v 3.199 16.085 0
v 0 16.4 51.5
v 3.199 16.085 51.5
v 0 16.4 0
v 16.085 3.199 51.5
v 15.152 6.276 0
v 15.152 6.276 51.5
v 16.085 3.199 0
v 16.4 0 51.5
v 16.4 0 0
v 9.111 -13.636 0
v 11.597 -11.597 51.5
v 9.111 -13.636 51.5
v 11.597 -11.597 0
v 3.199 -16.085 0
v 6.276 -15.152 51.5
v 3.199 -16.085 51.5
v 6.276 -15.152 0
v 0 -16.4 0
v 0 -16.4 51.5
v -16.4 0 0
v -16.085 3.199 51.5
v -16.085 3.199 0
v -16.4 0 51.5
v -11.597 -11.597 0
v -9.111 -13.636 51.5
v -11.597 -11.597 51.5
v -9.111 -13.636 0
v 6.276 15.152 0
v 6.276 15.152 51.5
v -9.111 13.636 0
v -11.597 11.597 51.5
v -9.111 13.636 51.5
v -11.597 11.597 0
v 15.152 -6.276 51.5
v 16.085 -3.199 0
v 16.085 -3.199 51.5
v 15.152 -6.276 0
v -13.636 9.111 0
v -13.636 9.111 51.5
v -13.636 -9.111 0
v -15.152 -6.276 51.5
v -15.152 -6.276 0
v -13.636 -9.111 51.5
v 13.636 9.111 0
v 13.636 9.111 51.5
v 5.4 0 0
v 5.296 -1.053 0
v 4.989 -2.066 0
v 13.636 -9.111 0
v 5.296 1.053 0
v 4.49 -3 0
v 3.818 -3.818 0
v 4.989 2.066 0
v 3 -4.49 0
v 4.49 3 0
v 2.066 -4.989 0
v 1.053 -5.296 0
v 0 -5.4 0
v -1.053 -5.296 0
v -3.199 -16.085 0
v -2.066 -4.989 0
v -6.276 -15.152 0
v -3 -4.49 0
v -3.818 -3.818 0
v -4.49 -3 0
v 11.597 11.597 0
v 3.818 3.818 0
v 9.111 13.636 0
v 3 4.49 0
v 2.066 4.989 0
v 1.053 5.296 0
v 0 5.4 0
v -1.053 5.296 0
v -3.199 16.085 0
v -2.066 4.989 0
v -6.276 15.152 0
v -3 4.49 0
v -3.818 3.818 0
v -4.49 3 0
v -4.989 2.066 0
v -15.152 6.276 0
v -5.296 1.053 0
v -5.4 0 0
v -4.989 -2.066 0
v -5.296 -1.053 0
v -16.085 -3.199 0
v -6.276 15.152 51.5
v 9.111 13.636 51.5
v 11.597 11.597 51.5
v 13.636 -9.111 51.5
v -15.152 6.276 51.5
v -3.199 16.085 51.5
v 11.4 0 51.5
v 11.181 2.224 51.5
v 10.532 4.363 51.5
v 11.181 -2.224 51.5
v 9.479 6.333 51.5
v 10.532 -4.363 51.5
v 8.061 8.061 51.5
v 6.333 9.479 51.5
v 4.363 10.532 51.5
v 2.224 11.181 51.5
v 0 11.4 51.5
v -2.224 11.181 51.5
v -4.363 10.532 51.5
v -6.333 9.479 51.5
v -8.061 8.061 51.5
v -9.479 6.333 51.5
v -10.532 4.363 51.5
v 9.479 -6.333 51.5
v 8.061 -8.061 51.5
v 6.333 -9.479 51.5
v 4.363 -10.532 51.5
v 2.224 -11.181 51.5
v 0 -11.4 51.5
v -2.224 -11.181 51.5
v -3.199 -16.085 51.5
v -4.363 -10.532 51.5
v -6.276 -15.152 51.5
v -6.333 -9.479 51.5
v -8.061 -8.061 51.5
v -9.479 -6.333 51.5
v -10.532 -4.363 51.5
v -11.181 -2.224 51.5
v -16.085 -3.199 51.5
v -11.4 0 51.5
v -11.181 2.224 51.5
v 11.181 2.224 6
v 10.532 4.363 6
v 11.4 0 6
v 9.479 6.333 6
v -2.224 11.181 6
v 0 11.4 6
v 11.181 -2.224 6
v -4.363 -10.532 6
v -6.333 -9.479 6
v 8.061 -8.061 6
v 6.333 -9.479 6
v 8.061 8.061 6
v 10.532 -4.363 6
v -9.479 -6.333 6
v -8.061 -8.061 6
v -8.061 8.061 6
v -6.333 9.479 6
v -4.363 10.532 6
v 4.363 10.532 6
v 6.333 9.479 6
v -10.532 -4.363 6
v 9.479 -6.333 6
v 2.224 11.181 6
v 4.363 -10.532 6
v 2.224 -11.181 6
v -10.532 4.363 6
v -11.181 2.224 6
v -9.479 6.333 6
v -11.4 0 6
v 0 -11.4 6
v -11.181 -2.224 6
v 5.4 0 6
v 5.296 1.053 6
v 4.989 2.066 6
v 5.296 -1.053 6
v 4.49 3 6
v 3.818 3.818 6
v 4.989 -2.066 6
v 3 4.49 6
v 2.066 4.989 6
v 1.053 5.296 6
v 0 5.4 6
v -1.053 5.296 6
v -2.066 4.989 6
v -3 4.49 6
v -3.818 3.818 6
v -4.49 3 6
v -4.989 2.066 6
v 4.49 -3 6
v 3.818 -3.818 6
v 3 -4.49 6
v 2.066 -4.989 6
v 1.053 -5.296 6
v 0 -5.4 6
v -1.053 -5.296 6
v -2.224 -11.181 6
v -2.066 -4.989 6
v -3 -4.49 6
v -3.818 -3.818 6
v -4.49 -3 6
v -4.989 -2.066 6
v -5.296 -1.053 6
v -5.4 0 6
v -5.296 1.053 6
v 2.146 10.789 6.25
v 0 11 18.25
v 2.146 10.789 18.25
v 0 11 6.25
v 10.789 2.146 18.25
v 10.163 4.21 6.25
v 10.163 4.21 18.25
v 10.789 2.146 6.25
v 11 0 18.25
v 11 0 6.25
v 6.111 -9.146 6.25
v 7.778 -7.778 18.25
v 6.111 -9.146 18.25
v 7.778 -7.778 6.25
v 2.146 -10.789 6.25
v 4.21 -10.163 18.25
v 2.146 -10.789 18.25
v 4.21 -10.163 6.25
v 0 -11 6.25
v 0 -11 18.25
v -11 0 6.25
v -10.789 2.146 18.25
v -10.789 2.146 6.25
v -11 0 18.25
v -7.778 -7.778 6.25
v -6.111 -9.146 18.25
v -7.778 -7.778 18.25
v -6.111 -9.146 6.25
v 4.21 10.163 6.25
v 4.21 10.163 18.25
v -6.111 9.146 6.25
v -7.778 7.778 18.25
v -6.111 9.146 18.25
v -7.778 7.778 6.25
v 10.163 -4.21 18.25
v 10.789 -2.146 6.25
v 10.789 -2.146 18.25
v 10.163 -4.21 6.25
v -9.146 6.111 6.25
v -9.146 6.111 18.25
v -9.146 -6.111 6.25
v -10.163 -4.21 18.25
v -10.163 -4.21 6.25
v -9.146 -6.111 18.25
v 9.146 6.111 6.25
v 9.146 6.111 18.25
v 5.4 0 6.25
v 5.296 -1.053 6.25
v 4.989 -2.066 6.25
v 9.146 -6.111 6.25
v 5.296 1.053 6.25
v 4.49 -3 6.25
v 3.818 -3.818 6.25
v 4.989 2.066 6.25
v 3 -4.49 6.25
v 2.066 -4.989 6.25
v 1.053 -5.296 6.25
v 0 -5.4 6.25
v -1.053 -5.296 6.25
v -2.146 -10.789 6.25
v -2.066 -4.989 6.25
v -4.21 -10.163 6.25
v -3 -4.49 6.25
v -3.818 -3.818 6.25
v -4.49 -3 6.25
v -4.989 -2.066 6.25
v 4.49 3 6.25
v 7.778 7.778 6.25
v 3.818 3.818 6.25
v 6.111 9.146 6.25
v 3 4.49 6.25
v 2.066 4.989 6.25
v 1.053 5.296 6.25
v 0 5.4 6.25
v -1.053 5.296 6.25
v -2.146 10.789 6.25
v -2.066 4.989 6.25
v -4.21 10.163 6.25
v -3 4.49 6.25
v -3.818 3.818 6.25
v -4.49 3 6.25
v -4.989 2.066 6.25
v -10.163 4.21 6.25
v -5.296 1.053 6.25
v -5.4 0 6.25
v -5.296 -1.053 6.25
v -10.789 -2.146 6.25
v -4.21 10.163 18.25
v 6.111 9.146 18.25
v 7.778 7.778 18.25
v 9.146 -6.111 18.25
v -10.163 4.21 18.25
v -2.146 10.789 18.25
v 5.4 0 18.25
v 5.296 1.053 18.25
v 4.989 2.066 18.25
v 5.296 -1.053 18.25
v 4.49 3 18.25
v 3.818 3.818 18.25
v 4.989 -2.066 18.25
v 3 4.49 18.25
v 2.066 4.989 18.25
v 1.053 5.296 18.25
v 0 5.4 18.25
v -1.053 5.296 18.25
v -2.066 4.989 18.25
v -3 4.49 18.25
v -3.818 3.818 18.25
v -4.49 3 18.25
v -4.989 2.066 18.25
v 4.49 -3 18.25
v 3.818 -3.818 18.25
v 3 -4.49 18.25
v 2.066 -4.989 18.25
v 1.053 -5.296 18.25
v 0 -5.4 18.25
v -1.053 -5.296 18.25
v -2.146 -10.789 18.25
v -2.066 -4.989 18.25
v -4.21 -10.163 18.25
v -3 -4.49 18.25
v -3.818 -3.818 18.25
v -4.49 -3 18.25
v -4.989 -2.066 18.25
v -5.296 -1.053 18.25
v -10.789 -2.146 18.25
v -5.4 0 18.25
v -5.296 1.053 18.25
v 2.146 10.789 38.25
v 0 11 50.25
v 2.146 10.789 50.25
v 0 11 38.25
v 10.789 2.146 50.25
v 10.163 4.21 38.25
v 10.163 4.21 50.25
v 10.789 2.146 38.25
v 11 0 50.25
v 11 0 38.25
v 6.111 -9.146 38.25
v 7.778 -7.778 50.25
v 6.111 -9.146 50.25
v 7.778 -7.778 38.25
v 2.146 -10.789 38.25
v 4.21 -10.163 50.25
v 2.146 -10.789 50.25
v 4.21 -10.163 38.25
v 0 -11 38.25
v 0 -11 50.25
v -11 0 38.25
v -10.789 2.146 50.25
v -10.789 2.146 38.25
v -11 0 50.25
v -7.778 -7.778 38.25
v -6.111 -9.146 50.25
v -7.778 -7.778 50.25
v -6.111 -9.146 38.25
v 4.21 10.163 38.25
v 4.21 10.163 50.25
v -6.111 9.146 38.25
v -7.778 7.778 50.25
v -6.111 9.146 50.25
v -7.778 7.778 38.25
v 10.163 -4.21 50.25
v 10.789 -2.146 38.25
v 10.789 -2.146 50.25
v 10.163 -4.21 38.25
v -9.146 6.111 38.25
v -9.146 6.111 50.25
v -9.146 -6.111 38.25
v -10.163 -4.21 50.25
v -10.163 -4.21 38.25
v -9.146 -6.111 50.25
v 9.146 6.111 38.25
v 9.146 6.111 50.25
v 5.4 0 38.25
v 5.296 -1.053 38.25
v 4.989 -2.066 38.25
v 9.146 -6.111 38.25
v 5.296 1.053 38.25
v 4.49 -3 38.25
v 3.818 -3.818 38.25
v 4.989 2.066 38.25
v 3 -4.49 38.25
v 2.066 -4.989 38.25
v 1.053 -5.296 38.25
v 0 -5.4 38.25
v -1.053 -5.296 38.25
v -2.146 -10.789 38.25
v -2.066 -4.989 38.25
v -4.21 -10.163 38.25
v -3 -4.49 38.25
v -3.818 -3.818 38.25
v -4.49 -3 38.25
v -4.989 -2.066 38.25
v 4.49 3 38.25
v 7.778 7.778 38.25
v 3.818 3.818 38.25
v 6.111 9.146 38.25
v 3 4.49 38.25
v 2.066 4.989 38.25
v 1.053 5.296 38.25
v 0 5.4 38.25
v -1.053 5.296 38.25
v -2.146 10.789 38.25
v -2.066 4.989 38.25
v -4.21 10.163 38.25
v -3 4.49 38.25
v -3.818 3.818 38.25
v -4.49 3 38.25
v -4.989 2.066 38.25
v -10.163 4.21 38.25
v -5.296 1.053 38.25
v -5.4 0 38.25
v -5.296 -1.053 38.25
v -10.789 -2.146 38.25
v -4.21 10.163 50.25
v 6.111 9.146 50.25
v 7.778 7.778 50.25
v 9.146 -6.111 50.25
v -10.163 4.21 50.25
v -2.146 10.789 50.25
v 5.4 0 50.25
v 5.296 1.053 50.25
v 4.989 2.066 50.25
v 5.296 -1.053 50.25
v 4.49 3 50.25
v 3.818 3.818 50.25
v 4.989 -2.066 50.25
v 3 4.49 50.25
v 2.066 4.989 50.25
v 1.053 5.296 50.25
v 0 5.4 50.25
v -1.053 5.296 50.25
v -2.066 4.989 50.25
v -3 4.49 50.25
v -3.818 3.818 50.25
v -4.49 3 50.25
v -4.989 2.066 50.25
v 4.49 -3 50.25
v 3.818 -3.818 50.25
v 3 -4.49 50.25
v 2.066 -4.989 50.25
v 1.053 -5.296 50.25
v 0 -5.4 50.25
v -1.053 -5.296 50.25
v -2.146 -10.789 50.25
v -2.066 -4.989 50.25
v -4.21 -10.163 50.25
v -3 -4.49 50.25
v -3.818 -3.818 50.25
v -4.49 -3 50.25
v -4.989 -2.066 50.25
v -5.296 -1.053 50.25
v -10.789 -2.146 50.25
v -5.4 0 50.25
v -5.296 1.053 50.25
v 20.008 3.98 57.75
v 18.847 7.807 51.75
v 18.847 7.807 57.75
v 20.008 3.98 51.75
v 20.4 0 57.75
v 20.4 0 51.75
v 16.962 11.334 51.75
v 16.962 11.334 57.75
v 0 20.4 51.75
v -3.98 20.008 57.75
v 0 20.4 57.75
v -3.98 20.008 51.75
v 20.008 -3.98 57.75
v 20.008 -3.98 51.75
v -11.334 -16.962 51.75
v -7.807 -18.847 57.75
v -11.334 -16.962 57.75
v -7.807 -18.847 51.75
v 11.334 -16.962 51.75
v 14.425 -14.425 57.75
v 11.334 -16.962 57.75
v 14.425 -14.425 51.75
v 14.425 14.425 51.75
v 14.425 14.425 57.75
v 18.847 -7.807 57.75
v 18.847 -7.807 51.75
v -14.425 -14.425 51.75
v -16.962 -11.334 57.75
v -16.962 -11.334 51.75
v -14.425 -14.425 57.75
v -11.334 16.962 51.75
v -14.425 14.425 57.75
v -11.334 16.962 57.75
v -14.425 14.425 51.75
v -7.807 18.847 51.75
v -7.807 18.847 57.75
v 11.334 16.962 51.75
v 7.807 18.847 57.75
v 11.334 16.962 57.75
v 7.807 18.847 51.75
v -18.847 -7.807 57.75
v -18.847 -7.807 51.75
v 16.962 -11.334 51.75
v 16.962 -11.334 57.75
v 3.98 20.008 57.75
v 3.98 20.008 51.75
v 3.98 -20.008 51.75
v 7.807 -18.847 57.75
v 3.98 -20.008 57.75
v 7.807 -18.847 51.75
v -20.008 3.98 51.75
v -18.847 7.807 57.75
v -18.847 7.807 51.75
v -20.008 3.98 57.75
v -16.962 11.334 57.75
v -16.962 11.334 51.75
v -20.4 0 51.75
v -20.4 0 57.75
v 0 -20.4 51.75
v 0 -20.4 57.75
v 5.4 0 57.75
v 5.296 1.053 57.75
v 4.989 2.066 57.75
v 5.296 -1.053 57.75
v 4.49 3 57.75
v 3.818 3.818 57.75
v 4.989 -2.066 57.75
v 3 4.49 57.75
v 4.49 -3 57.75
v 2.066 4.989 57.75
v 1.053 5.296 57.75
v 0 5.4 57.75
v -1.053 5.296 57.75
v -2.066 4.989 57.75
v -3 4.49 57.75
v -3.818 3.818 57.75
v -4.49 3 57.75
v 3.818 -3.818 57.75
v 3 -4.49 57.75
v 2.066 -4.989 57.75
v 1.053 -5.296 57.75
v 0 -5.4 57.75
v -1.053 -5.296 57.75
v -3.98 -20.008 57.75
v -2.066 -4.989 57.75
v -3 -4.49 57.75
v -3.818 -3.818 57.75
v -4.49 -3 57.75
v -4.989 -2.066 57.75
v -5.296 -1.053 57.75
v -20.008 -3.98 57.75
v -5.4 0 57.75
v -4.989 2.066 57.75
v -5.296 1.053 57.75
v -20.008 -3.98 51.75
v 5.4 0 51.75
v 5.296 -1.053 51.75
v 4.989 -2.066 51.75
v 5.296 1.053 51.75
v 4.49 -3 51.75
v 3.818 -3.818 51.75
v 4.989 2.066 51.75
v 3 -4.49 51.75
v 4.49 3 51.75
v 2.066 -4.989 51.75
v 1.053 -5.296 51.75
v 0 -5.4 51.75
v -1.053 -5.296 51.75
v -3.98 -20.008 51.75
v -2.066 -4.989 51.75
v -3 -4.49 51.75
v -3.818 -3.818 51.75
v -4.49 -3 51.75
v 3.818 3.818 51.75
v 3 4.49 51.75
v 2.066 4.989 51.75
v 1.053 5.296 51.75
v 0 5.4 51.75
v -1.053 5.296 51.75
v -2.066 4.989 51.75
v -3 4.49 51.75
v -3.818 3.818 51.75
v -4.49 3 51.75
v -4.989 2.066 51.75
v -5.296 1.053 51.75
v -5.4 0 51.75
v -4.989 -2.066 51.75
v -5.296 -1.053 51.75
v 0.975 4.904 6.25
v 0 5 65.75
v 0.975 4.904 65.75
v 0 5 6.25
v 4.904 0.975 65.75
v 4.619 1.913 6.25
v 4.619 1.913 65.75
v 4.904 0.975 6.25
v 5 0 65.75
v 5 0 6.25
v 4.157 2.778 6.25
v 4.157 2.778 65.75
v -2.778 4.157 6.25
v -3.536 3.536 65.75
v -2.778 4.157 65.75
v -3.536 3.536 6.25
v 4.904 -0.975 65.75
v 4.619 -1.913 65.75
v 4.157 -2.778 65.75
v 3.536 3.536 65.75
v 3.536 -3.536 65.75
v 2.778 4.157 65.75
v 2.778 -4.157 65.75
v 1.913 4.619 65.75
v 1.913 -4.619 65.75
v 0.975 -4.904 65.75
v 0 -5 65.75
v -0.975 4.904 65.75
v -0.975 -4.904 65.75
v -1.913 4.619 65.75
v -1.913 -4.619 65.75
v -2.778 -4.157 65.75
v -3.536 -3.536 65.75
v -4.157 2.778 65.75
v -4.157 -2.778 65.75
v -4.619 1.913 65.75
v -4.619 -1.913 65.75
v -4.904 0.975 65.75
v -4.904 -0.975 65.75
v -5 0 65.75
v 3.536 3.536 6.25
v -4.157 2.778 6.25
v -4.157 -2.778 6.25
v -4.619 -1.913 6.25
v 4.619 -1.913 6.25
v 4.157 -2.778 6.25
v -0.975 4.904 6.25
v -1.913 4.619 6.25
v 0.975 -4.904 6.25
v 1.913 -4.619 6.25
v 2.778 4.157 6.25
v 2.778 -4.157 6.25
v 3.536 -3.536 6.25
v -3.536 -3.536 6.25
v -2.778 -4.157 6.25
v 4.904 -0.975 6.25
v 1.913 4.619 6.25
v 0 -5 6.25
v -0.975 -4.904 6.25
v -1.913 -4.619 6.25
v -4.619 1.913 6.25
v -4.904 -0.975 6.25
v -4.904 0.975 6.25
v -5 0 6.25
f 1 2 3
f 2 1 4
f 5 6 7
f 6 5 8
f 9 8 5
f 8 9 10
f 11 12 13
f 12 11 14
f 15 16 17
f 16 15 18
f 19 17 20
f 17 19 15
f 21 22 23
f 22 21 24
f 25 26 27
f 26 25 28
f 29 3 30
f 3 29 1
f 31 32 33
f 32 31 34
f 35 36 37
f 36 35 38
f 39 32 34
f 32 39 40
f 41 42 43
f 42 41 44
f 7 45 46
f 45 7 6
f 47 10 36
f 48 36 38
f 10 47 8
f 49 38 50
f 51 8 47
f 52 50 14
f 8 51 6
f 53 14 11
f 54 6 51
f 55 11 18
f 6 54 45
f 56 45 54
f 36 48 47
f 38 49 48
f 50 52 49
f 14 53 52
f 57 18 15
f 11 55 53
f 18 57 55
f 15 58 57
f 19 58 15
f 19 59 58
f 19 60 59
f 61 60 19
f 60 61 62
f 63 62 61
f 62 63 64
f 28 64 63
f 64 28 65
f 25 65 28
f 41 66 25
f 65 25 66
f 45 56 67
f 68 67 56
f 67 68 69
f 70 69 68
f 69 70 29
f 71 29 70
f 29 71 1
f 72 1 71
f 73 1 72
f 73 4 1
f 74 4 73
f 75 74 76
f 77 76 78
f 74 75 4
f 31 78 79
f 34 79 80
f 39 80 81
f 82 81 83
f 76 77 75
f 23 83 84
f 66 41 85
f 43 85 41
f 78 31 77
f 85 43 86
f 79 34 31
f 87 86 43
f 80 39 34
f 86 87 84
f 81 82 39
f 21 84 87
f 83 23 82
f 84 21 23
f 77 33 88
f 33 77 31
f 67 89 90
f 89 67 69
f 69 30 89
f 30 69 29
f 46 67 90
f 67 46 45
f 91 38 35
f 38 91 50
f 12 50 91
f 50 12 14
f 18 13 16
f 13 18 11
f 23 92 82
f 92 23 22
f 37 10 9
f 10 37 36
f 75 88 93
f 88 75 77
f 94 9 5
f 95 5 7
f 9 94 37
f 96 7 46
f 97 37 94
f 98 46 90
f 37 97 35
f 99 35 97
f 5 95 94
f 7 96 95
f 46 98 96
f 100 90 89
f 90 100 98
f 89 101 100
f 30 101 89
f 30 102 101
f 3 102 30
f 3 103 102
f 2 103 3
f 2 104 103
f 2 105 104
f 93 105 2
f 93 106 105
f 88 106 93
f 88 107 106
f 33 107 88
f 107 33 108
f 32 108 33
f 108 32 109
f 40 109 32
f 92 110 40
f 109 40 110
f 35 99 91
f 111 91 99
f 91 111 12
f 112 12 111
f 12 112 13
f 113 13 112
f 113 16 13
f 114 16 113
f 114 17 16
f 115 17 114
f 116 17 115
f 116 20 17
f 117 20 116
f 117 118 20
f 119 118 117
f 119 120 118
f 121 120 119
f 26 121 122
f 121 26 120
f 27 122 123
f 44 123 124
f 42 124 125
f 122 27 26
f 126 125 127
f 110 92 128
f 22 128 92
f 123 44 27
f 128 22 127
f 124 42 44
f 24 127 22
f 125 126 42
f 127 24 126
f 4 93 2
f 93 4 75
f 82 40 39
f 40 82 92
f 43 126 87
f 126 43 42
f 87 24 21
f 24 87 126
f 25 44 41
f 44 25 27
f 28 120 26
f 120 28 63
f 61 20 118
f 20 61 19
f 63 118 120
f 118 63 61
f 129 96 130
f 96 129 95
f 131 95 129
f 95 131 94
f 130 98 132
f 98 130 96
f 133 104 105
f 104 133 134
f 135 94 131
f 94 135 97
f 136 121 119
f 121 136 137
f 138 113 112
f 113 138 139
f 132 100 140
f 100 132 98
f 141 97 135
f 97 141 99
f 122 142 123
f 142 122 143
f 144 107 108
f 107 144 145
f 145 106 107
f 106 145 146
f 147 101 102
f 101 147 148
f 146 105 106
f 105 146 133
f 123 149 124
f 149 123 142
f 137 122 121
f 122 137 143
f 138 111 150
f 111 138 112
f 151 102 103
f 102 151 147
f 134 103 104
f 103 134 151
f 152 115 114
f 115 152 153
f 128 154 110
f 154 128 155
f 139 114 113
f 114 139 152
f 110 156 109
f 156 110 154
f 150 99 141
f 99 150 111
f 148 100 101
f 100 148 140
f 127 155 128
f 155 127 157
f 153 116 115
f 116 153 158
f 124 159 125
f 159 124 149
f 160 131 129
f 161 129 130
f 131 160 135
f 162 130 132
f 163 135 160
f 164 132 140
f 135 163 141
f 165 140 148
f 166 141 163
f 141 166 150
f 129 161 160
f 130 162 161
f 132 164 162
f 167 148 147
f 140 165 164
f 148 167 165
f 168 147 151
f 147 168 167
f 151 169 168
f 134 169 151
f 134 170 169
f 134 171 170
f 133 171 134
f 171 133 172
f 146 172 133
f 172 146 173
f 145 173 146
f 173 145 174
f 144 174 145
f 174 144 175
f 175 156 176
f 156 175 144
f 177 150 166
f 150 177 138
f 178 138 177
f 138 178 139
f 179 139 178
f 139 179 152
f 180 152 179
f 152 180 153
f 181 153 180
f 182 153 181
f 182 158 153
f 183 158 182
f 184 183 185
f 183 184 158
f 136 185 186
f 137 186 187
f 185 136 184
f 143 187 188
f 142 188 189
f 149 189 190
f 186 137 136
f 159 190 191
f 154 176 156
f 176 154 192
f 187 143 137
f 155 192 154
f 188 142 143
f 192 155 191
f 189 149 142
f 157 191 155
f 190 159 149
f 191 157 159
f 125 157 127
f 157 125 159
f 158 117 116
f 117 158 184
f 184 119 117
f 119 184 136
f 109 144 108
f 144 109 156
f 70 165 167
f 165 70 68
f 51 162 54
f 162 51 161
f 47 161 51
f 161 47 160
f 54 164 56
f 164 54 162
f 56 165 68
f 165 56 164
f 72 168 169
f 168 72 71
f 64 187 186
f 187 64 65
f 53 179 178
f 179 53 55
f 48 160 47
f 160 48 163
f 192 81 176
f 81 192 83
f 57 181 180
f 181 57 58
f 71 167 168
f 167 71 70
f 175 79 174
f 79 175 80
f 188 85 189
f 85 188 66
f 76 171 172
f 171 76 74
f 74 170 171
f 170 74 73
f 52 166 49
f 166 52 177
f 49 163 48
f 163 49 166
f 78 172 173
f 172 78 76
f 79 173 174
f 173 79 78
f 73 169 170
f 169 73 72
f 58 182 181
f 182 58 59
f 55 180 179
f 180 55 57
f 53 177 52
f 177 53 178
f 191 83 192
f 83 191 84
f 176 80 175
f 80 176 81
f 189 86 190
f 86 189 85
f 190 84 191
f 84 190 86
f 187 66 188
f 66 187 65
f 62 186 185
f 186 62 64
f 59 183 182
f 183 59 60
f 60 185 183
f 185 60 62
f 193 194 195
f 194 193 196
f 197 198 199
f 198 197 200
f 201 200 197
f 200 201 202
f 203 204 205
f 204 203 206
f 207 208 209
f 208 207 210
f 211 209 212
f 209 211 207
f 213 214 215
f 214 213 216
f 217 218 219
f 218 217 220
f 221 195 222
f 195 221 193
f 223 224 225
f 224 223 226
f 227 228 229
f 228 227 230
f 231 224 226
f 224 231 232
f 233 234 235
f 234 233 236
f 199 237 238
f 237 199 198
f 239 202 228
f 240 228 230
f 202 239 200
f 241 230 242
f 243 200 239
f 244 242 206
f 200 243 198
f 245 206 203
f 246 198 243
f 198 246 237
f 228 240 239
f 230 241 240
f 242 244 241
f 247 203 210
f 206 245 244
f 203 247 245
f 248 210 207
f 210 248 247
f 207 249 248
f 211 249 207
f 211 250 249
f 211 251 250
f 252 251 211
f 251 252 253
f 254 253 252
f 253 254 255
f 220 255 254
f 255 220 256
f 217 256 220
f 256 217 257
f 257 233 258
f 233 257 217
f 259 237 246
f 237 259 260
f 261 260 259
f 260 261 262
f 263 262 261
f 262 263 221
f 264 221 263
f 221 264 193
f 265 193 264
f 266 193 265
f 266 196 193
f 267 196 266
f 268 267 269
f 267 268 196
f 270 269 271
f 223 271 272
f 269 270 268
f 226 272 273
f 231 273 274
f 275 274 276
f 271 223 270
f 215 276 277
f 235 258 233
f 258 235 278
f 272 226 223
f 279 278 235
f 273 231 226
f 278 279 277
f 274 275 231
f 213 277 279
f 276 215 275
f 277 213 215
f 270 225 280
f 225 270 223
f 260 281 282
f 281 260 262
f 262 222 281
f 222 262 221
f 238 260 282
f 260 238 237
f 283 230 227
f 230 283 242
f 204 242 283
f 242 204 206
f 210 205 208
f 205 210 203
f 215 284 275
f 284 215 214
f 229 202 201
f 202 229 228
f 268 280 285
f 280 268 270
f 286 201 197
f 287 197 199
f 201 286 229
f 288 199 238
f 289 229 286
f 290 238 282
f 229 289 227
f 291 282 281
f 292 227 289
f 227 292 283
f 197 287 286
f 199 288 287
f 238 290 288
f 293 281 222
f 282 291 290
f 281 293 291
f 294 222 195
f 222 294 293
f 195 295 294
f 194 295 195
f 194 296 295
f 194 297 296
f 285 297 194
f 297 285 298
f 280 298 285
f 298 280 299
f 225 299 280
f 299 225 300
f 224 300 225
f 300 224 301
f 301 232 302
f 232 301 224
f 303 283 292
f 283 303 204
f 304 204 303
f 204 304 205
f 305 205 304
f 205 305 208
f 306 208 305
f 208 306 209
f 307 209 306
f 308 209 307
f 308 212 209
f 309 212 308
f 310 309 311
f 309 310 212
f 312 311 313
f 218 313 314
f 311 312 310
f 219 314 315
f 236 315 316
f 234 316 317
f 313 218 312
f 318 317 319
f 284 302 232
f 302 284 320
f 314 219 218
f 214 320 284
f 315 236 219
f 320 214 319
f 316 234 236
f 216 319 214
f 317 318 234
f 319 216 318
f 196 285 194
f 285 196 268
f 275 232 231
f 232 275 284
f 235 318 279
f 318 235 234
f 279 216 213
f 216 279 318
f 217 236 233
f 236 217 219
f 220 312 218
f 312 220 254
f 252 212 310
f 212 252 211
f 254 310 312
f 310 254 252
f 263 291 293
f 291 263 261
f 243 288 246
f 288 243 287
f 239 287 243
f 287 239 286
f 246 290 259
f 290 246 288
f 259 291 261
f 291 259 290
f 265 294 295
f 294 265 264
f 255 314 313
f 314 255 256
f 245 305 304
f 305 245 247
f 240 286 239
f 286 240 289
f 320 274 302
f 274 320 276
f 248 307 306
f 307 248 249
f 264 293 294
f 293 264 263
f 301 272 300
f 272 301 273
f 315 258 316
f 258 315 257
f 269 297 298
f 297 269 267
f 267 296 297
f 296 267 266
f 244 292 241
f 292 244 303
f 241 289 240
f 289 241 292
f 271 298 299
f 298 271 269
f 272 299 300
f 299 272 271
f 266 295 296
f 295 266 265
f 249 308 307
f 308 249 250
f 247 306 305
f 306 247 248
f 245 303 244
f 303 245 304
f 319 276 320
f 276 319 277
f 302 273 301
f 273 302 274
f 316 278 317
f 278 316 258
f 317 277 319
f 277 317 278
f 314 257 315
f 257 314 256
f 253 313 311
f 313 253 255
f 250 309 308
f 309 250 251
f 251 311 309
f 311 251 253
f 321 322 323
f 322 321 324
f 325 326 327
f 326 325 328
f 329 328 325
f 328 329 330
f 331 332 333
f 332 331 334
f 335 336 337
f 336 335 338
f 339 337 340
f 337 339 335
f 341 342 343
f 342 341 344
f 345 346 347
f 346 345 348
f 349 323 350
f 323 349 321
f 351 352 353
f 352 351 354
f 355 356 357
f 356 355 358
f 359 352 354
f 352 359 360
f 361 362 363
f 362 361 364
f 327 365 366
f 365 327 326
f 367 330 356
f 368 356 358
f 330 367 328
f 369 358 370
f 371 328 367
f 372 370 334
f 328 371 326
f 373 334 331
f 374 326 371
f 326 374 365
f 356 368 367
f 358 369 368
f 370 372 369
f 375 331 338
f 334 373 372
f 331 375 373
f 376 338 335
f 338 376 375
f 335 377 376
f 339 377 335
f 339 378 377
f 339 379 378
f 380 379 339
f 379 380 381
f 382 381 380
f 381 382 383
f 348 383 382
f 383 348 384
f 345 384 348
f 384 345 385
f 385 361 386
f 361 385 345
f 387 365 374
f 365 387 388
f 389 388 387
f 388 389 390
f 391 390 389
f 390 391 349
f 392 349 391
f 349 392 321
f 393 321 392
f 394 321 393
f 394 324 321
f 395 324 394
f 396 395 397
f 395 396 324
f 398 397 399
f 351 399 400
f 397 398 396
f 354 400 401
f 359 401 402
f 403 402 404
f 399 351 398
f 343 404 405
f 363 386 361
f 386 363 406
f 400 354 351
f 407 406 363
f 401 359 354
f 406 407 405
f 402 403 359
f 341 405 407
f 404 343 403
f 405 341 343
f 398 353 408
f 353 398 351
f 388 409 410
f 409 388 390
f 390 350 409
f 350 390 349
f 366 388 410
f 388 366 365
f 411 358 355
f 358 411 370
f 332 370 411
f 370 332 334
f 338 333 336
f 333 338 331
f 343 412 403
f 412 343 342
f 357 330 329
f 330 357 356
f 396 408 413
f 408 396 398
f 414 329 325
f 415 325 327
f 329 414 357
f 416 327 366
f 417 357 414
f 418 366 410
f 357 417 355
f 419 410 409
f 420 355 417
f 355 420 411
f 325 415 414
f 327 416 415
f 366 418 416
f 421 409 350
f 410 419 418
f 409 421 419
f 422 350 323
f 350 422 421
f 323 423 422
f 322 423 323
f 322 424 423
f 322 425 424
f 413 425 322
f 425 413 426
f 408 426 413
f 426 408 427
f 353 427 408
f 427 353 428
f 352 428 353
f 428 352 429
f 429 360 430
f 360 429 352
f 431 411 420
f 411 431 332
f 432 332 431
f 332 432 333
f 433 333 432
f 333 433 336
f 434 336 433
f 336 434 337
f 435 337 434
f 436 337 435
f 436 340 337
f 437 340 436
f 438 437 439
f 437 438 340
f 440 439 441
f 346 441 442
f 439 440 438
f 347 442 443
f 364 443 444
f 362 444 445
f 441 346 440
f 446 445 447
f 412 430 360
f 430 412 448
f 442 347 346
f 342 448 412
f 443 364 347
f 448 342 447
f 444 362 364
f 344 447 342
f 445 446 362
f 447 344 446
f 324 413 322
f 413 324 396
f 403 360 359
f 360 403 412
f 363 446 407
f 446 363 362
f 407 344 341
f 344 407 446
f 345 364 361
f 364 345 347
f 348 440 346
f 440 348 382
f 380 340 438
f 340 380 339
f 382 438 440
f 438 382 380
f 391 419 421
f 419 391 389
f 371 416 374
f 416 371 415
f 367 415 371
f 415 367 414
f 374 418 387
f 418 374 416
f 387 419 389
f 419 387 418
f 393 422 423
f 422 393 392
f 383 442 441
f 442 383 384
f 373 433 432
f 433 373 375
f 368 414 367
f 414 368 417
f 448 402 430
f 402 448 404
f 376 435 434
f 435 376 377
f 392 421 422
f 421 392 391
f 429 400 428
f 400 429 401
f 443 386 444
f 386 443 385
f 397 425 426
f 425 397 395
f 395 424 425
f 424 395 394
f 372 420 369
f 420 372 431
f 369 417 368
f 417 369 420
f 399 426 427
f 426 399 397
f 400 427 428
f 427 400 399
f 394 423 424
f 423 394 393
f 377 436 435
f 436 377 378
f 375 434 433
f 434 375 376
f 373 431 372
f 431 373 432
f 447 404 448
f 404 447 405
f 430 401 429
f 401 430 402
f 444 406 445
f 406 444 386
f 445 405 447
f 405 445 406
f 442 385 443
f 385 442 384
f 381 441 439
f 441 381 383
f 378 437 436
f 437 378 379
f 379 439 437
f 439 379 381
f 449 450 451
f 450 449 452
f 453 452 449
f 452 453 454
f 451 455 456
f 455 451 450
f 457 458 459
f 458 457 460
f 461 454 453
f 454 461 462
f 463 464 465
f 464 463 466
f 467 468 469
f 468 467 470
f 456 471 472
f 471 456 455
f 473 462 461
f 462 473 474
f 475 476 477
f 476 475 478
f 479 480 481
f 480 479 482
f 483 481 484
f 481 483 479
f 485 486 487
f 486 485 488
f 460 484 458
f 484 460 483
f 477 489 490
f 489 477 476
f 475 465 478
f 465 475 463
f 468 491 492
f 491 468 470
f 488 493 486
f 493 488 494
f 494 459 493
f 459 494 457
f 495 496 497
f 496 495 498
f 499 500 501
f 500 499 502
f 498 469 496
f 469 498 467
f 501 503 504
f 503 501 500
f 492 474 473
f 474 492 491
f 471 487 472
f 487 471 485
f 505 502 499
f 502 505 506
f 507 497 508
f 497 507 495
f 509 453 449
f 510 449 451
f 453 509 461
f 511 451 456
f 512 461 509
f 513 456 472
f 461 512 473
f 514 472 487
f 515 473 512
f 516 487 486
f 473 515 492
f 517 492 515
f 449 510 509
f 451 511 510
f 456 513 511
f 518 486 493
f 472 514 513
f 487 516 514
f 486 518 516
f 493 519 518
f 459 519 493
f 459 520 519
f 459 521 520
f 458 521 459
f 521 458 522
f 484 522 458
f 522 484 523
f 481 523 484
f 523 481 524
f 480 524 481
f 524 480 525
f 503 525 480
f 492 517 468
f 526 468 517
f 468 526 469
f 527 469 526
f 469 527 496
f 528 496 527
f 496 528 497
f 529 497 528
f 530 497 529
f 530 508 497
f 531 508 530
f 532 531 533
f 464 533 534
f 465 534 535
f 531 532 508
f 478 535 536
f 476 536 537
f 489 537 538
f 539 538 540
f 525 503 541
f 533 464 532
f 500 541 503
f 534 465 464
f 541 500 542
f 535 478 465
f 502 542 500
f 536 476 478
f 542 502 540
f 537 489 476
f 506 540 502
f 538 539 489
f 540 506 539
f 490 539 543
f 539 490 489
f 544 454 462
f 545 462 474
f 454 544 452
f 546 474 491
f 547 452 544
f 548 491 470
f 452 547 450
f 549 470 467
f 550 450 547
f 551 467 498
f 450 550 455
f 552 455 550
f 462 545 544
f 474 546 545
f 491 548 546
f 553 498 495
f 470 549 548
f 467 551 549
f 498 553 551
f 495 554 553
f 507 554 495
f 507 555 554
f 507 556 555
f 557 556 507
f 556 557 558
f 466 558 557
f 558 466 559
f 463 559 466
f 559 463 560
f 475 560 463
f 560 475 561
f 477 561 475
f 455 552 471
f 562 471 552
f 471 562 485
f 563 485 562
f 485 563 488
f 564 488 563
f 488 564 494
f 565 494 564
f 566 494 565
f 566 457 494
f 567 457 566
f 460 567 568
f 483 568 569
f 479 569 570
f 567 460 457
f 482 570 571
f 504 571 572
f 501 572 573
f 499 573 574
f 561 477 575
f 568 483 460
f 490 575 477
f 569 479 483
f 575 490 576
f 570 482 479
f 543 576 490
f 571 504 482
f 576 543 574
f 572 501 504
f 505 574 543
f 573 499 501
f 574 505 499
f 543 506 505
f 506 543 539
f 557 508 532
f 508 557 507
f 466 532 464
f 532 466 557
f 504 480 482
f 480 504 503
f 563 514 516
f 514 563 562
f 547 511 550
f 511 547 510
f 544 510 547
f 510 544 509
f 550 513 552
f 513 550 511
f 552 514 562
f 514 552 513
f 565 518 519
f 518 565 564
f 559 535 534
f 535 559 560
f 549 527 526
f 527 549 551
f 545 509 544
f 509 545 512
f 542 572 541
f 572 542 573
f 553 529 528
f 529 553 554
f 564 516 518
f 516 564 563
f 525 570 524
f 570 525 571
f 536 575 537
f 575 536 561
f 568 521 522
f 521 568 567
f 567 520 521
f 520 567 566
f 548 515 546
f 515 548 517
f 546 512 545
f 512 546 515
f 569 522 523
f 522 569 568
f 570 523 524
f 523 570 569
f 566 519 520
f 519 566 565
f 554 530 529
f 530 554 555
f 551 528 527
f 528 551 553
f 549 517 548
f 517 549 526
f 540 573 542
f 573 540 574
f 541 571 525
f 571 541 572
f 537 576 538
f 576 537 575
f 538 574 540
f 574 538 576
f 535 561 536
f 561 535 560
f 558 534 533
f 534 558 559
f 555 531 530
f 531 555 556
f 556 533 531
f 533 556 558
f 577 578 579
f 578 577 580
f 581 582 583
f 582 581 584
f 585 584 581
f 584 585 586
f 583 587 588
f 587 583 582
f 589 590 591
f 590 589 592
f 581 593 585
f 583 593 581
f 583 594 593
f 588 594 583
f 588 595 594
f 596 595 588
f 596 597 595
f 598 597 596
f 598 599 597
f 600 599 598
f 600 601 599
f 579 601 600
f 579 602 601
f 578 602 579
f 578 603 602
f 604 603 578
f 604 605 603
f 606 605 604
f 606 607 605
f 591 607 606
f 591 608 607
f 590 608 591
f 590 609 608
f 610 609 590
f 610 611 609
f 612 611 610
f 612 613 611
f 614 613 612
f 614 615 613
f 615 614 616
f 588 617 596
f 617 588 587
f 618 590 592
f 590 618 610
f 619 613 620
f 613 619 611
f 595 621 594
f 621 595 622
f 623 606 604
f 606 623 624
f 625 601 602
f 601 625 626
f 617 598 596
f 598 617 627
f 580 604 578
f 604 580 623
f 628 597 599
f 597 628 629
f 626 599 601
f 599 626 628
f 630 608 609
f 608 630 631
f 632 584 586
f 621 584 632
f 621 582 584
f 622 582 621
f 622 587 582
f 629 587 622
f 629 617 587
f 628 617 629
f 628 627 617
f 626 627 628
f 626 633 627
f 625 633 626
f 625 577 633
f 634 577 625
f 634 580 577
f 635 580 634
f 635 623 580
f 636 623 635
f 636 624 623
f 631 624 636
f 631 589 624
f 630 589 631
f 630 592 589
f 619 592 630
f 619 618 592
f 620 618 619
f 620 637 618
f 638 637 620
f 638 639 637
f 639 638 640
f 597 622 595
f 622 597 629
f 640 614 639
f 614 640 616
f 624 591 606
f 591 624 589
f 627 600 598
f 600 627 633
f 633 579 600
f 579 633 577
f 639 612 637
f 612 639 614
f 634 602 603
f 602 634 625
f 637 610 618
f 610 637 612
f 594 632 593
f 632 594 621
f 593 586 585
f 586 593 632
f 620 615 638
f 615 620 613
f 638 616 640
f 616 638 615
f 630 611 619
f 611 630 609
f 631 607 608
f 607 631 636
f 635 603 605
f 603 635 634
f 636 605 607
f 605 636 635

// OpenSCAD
$fn = 32;

// ------------------------------------------------------------------------
// Shaft station: cup d32.8 x 51.5 mm, shaft d10
// Every part is its own module, assembly() places every instance.
// ------------------------------------------------------------------------

// --- part 1 ---
module housing_cup() {
  difference() {
    cylinder(h = 51.5, d = 32.8);
    translate([0, 0, 6]) cylinder(h = 46.5, d = 22.8);
    translate([0, 0, -1]) cylinder(h = 8, d = 10.8);
  }
}

// --- part 2 ---
module bearing_lower() {
  difference() {
      translate([0, 0, 0]) cylinder(h = 12, d = 22);
      translate([0, 0, -1]) cylinder(h = 14, d = 10.8);
    }
}

// --- part 3 ---
module bearing_upper() {
  difference() {
      translate([0, 0, 0]) cylinder(h = 12, d = 22);
      translate([0, 0, -1]) cylinder(h = 14, d = 10.8);
    }
}

// --- part 4 ---
module station_shaft() {
  translate([0, 0, -29.75]) cylinder(h = 59.5, d = 10);
}

// --- part 5 ---
module station_cover() {
  difference() {
    cylinder(h = 6, d = 40.8);
    translate([0, 0, -1]) cylinder(h = 8, d = 10.8);
  }
}

// --- assembly ---
module assembly() {
  color([0.80, 0.24, 0.20]) translate([0, 0, 0]) rotate([0, 0, 0]) housing_cup();
  color([0.20, 0.45, 0.75]) translate([0, 0, 6.25]) rotate([0, 0, 0]) bearing_lower();
  color([0.25, 0.62, 0.32]) translate([0, 0, 38.25]) rotate([0, 0, 0]) bearing_upper();
  color([0.92, 0.70, 0.18]) translate([0, 0, 36]) rotate([0, 0, 0]) station_shaft();
  color([0.58, 0.35, 0.70]) translate([0, 0, 51.75]) rotate([0, 0, 0]) station_cover();
}

assembly();
